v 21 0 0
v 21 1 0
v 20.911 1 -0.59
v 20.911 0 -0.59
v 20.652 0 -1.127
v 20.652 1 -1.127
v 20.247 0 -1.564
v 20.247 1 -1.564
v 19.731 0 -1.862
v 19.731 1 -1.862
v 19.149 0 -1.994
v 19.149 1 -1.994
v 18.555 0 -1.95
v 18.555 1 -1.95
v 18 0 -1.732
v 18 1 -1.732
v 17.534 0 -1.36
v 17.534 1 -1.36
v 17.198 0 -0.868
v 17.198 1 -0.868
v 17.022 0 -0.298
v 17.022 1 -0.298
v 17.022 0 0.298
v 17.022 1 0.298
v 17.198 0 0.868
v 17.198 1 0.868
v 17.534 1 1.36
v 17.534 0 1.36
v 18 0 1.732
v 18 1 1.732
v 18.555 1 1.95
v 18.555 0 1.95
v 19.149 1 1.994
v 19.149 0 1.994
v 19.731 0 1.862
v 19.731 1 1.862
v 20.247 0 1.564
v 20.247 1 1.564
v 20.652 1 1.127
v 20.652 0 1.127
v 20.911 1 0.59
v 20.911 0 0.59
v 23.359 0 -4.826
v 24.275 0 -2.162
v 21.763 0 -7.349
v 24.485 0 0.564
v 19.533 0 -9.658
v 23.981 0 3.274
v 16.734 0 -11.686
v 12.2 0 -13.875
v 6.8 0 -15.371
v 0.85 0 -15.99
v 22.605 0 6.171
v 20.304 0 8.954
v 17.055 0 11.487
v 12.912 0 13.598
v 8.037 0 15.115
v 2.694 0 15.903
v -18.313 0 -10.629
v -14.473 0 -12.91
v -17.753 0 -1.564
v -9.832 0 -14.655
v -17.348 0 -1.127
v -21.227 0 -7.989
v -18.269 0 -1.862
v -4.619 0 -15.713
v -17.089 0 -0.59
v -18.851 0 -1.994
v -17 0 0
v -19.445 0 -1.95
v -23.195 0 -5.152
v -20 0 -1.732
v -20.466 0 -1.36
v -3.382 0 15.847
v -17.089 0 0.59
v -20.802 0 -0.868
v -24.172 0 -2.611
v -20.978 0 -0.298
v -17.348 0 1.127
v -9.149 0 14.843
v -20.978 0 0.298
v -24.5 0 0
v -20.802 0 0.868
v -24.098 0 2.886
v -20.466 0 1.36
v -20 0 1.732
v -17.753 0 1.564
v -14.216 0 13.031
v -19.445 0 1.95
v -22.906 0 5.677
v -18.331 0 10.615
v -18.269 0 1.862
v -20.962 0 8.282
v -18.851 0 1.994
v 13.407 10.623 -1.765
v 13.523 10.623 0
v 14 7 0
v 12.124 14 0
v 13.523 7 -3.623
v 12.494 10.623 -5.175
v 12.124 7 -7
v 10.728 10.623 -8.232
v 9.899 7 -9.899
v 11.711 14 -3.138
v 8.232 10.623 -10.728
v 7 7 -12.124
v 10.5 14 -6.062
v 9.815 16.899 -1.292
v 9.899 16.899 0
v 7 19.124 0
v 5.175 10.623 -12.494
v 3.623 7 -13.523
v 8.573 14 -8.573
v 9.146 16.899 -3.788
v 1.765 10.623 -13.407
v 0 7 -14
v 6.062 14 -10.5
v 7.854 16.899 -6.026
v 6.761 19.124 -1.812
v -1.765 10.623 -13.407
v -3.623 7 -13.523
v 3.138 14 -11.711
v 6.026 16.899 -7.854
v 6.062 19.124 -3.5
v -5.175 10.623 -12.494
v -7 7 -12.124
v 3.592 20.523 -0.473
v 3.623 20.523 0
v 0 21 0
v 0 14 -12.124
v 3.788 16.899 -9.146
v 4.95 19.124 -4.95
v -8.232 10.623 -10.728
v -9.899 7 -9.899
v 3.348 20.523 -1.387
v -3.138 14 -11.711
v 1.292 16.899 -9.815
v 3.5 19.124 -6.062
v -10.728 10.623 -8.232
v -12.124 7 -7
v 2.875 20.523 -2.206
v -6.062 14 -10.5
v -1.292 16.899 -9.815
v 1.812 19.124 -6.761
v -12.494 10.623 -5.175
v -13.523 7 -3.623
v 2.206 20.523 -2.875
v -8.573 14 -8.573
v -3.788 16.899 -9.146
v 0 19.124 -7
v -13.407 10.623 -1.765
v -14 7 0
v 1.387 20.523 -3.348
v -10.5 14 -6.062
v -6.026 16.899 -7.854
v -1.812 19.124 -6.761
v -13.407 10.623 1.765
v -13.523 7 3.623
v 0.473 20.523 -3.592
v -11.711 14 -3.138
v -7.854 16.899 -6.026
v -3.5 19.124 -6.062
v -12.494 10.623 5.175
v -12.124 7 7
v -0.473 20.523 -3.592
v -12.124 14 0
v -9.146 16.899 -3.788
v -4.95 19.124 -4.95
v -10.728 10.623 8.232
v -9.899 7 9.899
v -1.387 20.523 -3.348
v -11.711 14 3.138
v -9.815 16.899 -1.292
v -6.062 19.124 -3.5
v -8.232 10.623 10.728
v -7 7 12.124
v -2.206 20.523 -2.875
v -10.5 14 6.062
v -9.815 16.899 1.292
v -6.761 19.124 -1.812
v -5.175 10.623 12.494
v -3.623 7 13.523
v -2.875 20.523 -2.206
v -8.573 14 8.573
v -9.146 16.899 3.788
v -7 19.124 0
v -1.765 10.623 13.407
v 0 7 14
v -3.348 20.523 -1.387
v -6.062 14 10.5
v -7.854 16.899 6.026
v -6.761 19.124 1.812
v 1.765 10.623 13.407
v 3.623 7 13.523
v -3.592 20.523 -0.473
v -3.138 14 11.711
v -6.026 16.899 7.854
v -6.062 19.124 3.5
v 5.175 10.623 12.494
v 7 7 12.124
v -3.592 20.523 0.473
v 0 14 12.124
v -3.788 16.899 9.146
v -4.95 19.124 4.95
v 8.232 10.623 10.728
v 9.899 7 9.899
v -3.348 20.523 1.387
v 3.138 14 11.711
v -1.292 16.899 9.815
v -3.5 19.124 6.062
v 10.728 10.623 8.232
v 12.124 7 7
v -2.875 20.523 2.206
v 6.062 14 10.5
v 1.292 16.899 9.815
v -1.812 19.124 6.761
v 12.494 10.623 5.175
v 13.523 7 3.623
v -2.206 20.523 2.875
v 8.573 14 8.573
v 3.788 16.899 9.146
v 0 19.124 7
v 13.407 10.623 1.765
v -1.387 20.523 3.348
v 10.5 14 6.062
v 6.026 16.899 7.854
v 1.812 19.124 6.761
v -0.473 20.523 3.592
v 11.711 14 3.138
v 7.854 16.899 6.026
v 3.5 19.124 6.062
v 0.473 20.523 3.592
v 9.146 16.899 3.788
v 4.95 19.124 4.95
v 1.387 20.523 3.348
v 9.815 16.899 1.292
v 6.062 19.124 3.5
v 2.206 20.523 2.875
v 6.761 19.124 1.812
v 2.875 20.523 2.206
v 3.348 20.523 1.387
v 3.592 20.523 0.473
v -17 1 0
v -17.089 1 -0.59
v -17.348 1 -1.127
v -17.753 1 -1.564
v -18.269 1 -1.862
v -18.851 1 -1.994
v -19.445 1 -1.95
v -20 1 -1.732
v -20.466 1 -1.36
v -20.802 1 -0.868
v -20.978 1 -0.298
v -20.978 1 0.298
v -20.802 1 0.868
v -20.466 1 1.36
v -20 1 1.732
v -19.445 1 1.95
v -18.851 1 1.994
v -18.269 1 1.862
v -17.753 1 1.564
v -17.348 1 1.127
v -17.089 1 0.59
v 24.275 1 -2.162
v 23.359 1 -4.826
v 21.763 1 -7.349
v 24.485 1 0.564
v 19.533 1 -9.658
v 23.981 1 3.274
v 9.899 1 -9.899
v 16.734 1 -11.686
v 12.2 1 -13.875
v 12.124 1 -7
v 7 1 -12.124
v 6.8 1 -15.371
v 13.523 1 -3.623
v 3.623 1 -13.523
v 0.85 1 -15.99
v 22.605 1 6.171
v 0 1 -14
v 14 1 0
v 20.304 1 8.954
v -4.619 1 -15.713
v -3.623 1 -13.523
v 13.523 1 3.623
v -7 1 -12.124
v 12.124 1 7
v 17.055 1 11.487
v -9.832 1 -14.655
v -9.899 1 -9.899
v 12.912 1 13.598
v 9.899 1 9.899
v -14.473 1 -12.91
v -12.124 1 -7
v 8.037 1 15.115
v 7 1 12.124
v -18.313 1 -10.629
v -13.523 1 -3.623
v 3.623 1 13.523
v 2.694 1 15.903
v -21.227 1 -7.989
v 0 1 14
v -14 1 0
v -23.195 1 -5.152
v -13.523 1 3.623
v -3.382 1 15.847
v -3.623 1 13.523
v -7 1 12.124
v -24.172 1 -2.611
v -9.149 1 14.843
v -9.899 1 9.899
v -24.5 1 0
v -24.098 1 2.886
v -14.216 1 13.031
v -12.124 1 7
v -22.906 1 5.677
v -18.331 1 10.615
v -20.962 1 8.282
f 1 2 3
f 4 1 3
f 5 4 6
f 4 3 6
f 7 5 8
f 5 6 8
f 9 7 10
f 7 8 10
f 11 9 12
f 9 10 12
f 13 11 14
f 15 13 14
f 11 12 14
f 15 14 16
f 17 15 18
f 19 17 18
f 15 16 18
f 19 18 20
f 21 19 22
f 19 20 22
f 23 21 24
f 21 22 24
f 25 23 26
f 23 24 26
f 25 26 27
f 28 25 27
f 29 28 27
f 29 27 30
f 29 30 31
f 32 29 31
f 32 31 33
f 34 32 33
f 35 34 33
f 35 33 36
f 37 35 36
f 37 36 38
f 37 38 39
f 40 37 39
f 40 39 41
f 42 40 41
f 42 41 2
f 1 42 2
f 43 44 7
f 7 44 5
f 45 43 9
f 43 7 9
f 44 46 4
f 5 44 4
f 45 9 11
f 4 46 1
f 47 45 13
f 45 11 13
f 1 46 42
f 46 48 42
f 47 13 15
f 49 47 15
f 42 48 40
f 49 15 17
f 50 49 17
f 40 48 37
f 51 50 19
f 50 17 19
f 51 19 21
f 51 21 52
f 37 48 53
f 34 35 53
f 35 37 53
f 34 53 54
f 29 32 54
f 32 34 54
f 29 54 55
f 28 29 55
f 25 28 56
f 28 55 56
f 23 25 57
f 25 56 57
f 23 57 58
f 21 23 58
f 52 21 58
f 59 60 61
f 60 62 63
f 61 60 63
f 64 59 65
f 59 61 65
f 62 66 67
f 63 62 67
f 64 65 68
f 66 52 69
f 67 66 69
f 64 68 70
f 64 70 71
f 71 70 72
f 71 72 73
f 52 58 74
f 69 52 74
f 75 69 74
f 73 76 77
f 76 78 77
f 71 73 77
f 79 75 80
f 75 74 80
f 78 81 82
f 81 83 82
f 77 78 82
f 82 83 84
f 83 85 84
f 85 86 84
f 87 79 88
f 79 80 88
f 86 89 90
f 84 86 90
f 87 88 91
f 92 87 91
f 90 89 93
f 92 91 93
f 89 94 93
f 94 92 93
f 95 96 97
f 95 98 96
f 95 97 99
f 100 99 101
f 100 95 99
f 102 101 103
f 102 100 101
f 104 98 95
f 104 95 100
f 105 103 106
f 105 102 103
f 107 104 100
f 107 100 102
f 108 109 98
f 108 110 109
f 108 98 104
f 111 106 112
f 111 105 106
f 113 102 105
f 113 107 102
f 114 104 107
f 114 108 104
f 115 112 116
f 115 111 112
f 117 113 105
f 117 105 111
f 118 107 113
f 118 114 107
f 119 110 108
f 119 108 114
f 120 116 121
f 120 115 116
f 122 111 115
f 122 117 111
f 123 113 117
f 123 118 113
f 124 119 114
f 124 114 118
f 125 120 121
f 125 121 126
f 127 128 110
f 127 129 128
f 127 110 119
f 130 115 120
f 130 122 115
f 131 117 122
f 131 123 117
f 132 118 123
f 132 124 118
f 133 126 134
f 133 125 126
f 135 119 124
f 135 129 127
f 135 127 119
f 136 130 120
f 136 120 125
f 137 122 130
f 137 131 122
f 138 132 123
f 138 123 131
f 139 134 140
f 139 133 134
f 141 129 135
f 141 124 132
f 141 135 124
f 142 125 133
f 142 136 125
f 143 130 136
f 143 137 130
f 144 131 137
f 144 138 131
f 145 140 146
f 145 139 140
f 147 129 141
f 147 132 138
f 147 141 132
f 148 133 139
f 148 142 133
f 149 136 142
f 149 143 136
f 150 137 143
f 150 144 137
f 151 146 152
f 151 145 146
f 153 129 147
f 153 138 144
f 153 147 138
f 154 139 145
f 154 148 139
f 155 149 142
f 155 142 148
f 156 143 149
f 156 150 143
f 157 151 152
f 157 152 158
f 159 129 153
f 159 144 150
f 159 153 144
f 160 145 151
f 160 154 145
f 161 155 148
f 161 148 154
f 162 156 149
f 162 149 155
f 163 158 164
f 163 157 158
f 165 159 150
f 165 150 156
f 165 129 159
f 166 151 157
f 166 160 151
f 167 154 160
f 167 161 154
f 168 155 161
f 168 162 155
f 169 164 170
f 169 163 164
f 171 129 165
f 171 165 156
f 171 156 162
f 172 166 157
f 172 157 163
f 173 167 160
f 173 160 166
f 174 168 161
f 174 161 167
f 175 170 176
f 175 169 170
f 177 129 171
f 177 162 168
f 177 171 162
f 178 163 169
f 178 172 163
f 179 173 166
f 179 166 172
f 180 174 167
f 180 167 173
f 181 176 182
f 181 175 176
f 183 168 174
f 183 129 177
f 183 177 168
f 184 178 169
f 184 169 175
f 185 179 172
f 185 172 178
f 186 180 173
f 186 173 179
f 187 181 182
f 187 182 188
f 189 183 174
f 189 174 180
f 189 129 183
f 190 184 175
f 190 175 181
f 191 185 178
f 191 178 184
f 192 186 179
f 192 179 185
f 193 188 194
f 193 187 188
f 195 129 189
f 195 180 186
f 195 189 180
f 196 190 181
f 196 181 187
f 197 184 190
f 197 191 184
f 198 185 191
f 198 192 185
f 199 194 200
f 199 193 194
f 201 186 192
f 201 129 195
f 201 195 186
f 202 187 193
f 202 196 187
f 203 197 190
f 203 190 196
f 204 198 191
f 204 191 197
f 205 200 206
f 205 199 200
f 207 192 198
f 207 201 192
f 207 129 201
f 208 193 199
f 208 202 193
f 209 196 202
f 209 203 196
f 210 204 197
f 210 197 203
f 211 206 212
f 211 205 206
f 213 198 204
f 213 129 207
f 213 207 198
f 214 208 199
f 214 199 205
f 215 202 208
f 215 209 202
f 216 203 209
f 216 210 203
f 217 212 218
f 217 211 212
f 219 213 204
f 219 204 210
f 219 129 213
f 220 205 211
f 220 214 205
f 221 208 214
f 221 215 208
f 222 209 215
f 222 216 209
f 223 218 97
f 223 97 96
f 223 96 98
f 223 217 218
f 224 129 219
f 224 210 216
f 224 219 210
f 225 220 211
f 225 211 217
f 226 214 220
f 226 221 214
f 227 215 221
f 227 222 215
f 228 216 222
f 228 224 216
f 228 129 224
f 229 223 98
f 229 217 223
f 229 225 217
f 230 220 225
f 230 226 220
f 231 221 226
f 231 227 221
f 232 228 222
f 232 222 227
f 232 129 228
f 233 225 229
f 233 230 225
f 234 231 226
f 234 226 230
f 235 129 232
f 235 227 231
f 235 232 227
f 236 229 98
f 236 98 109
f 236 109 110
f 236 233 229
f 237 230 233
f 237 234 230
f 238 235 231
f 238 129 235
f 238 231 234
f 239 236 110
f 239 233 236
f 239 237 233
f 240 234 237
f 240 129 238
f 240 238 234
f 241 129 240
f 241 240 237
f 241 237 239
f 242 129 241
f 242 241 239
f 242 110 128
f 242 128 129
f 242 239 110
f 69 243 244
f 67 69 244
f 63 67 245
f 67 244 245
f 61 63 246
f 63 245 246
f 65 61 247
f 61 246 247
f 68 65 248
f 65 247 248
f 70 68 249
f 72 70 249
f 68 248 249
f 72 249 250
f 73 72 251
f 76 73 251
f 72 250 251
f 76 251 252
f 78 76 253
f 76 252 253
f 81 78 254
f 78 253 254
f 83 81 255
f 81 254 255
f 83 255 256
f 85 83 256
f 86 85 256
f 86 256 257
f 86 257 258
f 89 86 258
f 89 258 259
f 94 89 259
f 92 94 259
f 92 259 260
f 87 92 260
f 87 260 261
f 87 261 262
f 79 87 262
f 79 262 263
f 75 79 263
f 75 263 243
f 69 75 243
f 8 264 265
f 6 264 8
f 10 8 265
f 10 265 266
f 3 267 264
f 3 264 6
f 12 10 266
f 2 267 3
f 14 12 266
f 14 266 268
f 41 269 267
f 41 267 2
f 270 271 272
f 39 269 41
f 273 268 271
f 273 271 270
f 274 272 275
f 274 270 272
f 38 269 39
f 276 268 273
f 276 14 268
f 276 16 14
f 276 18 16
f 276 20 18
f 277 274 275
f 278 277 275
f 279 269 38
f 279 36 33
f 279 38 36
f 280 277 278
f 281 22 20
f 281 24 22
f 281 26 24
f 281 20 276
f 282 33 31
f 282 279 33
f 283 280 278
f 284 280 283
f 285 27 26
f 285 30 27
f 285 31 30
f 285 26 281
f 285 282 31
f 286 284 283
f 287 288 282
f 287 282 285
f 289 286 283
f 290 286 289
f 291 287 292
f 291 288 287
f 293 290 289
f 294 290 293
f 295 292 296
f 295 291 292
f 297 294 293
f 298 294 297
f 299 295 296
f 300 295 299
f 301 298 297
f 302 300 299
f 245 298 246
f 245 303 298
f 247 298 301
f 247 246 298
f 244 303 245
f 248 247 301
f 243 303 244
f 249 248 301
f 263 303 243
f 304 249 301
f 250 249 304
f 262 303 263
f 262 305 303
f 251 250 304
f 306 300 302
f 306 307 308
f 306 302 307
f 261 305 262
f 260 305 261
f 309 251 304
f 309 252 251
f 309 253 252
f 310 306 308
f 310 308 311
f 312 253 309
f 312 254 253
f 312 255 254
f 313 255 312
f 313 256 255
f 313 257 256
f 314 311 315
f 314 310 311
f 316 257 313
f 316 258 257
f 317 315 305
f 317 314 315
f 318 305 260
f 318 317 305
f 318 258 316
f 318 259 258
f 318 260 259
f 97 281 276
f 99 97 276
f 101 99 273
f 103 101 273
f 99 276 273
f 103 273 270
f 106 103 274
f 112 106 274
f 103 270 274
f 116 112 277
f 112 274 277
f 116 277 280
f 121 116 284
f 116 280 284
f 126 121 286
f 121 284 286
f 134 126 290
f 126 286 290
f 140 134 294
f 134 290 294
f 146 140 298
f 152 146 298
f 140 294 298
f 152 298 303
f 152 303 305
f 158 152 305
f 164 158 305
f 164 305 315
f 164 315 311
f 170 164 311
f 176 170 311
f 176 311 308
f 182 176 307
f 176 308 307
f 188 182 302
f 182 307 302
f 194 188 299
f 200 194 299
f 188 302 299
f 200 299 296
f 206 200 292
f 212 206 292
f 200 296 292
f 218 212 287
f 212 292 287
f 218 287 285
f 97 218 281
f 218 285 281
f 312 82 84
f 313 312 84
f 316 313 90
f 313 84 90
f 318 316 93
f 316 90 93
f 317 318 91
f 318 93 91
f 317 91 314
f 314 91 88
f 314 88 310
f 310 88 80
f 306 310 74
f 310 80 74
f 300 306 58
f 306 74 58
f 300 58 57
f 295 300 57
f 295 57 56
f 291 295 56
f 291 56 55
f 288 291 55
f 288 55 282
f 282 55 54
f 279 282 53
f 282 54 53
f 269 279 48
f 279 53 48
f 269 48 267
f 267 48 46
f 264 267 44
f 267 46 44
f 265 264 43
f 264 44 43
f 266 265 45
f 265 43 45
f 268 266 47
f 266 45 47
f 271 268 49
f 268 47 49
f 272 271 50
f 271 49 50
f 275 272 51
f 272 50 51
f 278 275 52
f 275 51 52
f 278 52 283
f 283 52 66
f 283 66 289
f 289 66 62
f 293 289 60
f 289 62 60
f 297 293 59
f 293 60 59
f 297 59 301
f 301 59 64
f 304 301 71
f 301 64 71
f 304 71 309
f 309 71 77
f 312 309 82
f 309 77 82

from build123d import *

# Parameters (mm, degrees)
SKETCH1_RX           = 24.5
SKETCH1_RY           = 16
BASE_DEPTH           = 1
SKETCH2_R            = 14
SUPORTE_ESFERA_DEPTH = 20
FILLET1_R            = 14
SKETCH3_R            = 2
FUROS_BASE_DEPTH     = 2


with BuildPart() as part:
    # Sketch1 → Base (new body)
    with BuildSketch(Plane(origin=(0, 0, 0), x_dir=(1, 0, 0), z_dir=(0, 1, 0))):
        with Locations(Location((0, 0), (0, 0, 180))):
            Ellipse(SKETCH1_RX, SKETCH1_RY)
    extrude(amount=BASE_DEPTH)

    # Sketch2 → Suporte-esfera (add)
    with BuildSketch(Plane(origin=(0, 1, 0), x_dir=(1, 0, 0), z_dir=(0, 1, 0))):
        Circle(SKETCH2_R)
    extrude(amount=SUPORTE_ESFERA_DEPTH)

    # Fillet1
    fillet1_edges = [part.edges().sort_by_distance(p)[0] for p in [
        (-14, 21, 0),
    ]]
    fillet(fillet1_edges, radius=FILLET1_R)

    # Sketch3 → Furos-base (cut, through all)
    with BuildSketch(Plane(origin=(0, 1, 0), x_dir=(1, 0, 0), z_dir=(0, 1, 0))):
        with Locations((-19, 0)):
            Circle(SKETCH3_R)
        with Locations((19, 0)):
            Circle(SKETCH3_R)
    extrude(amount=-FUROS_BASE_DEPTH, mode=Mode.SUBTRACT)


solid = part.part
